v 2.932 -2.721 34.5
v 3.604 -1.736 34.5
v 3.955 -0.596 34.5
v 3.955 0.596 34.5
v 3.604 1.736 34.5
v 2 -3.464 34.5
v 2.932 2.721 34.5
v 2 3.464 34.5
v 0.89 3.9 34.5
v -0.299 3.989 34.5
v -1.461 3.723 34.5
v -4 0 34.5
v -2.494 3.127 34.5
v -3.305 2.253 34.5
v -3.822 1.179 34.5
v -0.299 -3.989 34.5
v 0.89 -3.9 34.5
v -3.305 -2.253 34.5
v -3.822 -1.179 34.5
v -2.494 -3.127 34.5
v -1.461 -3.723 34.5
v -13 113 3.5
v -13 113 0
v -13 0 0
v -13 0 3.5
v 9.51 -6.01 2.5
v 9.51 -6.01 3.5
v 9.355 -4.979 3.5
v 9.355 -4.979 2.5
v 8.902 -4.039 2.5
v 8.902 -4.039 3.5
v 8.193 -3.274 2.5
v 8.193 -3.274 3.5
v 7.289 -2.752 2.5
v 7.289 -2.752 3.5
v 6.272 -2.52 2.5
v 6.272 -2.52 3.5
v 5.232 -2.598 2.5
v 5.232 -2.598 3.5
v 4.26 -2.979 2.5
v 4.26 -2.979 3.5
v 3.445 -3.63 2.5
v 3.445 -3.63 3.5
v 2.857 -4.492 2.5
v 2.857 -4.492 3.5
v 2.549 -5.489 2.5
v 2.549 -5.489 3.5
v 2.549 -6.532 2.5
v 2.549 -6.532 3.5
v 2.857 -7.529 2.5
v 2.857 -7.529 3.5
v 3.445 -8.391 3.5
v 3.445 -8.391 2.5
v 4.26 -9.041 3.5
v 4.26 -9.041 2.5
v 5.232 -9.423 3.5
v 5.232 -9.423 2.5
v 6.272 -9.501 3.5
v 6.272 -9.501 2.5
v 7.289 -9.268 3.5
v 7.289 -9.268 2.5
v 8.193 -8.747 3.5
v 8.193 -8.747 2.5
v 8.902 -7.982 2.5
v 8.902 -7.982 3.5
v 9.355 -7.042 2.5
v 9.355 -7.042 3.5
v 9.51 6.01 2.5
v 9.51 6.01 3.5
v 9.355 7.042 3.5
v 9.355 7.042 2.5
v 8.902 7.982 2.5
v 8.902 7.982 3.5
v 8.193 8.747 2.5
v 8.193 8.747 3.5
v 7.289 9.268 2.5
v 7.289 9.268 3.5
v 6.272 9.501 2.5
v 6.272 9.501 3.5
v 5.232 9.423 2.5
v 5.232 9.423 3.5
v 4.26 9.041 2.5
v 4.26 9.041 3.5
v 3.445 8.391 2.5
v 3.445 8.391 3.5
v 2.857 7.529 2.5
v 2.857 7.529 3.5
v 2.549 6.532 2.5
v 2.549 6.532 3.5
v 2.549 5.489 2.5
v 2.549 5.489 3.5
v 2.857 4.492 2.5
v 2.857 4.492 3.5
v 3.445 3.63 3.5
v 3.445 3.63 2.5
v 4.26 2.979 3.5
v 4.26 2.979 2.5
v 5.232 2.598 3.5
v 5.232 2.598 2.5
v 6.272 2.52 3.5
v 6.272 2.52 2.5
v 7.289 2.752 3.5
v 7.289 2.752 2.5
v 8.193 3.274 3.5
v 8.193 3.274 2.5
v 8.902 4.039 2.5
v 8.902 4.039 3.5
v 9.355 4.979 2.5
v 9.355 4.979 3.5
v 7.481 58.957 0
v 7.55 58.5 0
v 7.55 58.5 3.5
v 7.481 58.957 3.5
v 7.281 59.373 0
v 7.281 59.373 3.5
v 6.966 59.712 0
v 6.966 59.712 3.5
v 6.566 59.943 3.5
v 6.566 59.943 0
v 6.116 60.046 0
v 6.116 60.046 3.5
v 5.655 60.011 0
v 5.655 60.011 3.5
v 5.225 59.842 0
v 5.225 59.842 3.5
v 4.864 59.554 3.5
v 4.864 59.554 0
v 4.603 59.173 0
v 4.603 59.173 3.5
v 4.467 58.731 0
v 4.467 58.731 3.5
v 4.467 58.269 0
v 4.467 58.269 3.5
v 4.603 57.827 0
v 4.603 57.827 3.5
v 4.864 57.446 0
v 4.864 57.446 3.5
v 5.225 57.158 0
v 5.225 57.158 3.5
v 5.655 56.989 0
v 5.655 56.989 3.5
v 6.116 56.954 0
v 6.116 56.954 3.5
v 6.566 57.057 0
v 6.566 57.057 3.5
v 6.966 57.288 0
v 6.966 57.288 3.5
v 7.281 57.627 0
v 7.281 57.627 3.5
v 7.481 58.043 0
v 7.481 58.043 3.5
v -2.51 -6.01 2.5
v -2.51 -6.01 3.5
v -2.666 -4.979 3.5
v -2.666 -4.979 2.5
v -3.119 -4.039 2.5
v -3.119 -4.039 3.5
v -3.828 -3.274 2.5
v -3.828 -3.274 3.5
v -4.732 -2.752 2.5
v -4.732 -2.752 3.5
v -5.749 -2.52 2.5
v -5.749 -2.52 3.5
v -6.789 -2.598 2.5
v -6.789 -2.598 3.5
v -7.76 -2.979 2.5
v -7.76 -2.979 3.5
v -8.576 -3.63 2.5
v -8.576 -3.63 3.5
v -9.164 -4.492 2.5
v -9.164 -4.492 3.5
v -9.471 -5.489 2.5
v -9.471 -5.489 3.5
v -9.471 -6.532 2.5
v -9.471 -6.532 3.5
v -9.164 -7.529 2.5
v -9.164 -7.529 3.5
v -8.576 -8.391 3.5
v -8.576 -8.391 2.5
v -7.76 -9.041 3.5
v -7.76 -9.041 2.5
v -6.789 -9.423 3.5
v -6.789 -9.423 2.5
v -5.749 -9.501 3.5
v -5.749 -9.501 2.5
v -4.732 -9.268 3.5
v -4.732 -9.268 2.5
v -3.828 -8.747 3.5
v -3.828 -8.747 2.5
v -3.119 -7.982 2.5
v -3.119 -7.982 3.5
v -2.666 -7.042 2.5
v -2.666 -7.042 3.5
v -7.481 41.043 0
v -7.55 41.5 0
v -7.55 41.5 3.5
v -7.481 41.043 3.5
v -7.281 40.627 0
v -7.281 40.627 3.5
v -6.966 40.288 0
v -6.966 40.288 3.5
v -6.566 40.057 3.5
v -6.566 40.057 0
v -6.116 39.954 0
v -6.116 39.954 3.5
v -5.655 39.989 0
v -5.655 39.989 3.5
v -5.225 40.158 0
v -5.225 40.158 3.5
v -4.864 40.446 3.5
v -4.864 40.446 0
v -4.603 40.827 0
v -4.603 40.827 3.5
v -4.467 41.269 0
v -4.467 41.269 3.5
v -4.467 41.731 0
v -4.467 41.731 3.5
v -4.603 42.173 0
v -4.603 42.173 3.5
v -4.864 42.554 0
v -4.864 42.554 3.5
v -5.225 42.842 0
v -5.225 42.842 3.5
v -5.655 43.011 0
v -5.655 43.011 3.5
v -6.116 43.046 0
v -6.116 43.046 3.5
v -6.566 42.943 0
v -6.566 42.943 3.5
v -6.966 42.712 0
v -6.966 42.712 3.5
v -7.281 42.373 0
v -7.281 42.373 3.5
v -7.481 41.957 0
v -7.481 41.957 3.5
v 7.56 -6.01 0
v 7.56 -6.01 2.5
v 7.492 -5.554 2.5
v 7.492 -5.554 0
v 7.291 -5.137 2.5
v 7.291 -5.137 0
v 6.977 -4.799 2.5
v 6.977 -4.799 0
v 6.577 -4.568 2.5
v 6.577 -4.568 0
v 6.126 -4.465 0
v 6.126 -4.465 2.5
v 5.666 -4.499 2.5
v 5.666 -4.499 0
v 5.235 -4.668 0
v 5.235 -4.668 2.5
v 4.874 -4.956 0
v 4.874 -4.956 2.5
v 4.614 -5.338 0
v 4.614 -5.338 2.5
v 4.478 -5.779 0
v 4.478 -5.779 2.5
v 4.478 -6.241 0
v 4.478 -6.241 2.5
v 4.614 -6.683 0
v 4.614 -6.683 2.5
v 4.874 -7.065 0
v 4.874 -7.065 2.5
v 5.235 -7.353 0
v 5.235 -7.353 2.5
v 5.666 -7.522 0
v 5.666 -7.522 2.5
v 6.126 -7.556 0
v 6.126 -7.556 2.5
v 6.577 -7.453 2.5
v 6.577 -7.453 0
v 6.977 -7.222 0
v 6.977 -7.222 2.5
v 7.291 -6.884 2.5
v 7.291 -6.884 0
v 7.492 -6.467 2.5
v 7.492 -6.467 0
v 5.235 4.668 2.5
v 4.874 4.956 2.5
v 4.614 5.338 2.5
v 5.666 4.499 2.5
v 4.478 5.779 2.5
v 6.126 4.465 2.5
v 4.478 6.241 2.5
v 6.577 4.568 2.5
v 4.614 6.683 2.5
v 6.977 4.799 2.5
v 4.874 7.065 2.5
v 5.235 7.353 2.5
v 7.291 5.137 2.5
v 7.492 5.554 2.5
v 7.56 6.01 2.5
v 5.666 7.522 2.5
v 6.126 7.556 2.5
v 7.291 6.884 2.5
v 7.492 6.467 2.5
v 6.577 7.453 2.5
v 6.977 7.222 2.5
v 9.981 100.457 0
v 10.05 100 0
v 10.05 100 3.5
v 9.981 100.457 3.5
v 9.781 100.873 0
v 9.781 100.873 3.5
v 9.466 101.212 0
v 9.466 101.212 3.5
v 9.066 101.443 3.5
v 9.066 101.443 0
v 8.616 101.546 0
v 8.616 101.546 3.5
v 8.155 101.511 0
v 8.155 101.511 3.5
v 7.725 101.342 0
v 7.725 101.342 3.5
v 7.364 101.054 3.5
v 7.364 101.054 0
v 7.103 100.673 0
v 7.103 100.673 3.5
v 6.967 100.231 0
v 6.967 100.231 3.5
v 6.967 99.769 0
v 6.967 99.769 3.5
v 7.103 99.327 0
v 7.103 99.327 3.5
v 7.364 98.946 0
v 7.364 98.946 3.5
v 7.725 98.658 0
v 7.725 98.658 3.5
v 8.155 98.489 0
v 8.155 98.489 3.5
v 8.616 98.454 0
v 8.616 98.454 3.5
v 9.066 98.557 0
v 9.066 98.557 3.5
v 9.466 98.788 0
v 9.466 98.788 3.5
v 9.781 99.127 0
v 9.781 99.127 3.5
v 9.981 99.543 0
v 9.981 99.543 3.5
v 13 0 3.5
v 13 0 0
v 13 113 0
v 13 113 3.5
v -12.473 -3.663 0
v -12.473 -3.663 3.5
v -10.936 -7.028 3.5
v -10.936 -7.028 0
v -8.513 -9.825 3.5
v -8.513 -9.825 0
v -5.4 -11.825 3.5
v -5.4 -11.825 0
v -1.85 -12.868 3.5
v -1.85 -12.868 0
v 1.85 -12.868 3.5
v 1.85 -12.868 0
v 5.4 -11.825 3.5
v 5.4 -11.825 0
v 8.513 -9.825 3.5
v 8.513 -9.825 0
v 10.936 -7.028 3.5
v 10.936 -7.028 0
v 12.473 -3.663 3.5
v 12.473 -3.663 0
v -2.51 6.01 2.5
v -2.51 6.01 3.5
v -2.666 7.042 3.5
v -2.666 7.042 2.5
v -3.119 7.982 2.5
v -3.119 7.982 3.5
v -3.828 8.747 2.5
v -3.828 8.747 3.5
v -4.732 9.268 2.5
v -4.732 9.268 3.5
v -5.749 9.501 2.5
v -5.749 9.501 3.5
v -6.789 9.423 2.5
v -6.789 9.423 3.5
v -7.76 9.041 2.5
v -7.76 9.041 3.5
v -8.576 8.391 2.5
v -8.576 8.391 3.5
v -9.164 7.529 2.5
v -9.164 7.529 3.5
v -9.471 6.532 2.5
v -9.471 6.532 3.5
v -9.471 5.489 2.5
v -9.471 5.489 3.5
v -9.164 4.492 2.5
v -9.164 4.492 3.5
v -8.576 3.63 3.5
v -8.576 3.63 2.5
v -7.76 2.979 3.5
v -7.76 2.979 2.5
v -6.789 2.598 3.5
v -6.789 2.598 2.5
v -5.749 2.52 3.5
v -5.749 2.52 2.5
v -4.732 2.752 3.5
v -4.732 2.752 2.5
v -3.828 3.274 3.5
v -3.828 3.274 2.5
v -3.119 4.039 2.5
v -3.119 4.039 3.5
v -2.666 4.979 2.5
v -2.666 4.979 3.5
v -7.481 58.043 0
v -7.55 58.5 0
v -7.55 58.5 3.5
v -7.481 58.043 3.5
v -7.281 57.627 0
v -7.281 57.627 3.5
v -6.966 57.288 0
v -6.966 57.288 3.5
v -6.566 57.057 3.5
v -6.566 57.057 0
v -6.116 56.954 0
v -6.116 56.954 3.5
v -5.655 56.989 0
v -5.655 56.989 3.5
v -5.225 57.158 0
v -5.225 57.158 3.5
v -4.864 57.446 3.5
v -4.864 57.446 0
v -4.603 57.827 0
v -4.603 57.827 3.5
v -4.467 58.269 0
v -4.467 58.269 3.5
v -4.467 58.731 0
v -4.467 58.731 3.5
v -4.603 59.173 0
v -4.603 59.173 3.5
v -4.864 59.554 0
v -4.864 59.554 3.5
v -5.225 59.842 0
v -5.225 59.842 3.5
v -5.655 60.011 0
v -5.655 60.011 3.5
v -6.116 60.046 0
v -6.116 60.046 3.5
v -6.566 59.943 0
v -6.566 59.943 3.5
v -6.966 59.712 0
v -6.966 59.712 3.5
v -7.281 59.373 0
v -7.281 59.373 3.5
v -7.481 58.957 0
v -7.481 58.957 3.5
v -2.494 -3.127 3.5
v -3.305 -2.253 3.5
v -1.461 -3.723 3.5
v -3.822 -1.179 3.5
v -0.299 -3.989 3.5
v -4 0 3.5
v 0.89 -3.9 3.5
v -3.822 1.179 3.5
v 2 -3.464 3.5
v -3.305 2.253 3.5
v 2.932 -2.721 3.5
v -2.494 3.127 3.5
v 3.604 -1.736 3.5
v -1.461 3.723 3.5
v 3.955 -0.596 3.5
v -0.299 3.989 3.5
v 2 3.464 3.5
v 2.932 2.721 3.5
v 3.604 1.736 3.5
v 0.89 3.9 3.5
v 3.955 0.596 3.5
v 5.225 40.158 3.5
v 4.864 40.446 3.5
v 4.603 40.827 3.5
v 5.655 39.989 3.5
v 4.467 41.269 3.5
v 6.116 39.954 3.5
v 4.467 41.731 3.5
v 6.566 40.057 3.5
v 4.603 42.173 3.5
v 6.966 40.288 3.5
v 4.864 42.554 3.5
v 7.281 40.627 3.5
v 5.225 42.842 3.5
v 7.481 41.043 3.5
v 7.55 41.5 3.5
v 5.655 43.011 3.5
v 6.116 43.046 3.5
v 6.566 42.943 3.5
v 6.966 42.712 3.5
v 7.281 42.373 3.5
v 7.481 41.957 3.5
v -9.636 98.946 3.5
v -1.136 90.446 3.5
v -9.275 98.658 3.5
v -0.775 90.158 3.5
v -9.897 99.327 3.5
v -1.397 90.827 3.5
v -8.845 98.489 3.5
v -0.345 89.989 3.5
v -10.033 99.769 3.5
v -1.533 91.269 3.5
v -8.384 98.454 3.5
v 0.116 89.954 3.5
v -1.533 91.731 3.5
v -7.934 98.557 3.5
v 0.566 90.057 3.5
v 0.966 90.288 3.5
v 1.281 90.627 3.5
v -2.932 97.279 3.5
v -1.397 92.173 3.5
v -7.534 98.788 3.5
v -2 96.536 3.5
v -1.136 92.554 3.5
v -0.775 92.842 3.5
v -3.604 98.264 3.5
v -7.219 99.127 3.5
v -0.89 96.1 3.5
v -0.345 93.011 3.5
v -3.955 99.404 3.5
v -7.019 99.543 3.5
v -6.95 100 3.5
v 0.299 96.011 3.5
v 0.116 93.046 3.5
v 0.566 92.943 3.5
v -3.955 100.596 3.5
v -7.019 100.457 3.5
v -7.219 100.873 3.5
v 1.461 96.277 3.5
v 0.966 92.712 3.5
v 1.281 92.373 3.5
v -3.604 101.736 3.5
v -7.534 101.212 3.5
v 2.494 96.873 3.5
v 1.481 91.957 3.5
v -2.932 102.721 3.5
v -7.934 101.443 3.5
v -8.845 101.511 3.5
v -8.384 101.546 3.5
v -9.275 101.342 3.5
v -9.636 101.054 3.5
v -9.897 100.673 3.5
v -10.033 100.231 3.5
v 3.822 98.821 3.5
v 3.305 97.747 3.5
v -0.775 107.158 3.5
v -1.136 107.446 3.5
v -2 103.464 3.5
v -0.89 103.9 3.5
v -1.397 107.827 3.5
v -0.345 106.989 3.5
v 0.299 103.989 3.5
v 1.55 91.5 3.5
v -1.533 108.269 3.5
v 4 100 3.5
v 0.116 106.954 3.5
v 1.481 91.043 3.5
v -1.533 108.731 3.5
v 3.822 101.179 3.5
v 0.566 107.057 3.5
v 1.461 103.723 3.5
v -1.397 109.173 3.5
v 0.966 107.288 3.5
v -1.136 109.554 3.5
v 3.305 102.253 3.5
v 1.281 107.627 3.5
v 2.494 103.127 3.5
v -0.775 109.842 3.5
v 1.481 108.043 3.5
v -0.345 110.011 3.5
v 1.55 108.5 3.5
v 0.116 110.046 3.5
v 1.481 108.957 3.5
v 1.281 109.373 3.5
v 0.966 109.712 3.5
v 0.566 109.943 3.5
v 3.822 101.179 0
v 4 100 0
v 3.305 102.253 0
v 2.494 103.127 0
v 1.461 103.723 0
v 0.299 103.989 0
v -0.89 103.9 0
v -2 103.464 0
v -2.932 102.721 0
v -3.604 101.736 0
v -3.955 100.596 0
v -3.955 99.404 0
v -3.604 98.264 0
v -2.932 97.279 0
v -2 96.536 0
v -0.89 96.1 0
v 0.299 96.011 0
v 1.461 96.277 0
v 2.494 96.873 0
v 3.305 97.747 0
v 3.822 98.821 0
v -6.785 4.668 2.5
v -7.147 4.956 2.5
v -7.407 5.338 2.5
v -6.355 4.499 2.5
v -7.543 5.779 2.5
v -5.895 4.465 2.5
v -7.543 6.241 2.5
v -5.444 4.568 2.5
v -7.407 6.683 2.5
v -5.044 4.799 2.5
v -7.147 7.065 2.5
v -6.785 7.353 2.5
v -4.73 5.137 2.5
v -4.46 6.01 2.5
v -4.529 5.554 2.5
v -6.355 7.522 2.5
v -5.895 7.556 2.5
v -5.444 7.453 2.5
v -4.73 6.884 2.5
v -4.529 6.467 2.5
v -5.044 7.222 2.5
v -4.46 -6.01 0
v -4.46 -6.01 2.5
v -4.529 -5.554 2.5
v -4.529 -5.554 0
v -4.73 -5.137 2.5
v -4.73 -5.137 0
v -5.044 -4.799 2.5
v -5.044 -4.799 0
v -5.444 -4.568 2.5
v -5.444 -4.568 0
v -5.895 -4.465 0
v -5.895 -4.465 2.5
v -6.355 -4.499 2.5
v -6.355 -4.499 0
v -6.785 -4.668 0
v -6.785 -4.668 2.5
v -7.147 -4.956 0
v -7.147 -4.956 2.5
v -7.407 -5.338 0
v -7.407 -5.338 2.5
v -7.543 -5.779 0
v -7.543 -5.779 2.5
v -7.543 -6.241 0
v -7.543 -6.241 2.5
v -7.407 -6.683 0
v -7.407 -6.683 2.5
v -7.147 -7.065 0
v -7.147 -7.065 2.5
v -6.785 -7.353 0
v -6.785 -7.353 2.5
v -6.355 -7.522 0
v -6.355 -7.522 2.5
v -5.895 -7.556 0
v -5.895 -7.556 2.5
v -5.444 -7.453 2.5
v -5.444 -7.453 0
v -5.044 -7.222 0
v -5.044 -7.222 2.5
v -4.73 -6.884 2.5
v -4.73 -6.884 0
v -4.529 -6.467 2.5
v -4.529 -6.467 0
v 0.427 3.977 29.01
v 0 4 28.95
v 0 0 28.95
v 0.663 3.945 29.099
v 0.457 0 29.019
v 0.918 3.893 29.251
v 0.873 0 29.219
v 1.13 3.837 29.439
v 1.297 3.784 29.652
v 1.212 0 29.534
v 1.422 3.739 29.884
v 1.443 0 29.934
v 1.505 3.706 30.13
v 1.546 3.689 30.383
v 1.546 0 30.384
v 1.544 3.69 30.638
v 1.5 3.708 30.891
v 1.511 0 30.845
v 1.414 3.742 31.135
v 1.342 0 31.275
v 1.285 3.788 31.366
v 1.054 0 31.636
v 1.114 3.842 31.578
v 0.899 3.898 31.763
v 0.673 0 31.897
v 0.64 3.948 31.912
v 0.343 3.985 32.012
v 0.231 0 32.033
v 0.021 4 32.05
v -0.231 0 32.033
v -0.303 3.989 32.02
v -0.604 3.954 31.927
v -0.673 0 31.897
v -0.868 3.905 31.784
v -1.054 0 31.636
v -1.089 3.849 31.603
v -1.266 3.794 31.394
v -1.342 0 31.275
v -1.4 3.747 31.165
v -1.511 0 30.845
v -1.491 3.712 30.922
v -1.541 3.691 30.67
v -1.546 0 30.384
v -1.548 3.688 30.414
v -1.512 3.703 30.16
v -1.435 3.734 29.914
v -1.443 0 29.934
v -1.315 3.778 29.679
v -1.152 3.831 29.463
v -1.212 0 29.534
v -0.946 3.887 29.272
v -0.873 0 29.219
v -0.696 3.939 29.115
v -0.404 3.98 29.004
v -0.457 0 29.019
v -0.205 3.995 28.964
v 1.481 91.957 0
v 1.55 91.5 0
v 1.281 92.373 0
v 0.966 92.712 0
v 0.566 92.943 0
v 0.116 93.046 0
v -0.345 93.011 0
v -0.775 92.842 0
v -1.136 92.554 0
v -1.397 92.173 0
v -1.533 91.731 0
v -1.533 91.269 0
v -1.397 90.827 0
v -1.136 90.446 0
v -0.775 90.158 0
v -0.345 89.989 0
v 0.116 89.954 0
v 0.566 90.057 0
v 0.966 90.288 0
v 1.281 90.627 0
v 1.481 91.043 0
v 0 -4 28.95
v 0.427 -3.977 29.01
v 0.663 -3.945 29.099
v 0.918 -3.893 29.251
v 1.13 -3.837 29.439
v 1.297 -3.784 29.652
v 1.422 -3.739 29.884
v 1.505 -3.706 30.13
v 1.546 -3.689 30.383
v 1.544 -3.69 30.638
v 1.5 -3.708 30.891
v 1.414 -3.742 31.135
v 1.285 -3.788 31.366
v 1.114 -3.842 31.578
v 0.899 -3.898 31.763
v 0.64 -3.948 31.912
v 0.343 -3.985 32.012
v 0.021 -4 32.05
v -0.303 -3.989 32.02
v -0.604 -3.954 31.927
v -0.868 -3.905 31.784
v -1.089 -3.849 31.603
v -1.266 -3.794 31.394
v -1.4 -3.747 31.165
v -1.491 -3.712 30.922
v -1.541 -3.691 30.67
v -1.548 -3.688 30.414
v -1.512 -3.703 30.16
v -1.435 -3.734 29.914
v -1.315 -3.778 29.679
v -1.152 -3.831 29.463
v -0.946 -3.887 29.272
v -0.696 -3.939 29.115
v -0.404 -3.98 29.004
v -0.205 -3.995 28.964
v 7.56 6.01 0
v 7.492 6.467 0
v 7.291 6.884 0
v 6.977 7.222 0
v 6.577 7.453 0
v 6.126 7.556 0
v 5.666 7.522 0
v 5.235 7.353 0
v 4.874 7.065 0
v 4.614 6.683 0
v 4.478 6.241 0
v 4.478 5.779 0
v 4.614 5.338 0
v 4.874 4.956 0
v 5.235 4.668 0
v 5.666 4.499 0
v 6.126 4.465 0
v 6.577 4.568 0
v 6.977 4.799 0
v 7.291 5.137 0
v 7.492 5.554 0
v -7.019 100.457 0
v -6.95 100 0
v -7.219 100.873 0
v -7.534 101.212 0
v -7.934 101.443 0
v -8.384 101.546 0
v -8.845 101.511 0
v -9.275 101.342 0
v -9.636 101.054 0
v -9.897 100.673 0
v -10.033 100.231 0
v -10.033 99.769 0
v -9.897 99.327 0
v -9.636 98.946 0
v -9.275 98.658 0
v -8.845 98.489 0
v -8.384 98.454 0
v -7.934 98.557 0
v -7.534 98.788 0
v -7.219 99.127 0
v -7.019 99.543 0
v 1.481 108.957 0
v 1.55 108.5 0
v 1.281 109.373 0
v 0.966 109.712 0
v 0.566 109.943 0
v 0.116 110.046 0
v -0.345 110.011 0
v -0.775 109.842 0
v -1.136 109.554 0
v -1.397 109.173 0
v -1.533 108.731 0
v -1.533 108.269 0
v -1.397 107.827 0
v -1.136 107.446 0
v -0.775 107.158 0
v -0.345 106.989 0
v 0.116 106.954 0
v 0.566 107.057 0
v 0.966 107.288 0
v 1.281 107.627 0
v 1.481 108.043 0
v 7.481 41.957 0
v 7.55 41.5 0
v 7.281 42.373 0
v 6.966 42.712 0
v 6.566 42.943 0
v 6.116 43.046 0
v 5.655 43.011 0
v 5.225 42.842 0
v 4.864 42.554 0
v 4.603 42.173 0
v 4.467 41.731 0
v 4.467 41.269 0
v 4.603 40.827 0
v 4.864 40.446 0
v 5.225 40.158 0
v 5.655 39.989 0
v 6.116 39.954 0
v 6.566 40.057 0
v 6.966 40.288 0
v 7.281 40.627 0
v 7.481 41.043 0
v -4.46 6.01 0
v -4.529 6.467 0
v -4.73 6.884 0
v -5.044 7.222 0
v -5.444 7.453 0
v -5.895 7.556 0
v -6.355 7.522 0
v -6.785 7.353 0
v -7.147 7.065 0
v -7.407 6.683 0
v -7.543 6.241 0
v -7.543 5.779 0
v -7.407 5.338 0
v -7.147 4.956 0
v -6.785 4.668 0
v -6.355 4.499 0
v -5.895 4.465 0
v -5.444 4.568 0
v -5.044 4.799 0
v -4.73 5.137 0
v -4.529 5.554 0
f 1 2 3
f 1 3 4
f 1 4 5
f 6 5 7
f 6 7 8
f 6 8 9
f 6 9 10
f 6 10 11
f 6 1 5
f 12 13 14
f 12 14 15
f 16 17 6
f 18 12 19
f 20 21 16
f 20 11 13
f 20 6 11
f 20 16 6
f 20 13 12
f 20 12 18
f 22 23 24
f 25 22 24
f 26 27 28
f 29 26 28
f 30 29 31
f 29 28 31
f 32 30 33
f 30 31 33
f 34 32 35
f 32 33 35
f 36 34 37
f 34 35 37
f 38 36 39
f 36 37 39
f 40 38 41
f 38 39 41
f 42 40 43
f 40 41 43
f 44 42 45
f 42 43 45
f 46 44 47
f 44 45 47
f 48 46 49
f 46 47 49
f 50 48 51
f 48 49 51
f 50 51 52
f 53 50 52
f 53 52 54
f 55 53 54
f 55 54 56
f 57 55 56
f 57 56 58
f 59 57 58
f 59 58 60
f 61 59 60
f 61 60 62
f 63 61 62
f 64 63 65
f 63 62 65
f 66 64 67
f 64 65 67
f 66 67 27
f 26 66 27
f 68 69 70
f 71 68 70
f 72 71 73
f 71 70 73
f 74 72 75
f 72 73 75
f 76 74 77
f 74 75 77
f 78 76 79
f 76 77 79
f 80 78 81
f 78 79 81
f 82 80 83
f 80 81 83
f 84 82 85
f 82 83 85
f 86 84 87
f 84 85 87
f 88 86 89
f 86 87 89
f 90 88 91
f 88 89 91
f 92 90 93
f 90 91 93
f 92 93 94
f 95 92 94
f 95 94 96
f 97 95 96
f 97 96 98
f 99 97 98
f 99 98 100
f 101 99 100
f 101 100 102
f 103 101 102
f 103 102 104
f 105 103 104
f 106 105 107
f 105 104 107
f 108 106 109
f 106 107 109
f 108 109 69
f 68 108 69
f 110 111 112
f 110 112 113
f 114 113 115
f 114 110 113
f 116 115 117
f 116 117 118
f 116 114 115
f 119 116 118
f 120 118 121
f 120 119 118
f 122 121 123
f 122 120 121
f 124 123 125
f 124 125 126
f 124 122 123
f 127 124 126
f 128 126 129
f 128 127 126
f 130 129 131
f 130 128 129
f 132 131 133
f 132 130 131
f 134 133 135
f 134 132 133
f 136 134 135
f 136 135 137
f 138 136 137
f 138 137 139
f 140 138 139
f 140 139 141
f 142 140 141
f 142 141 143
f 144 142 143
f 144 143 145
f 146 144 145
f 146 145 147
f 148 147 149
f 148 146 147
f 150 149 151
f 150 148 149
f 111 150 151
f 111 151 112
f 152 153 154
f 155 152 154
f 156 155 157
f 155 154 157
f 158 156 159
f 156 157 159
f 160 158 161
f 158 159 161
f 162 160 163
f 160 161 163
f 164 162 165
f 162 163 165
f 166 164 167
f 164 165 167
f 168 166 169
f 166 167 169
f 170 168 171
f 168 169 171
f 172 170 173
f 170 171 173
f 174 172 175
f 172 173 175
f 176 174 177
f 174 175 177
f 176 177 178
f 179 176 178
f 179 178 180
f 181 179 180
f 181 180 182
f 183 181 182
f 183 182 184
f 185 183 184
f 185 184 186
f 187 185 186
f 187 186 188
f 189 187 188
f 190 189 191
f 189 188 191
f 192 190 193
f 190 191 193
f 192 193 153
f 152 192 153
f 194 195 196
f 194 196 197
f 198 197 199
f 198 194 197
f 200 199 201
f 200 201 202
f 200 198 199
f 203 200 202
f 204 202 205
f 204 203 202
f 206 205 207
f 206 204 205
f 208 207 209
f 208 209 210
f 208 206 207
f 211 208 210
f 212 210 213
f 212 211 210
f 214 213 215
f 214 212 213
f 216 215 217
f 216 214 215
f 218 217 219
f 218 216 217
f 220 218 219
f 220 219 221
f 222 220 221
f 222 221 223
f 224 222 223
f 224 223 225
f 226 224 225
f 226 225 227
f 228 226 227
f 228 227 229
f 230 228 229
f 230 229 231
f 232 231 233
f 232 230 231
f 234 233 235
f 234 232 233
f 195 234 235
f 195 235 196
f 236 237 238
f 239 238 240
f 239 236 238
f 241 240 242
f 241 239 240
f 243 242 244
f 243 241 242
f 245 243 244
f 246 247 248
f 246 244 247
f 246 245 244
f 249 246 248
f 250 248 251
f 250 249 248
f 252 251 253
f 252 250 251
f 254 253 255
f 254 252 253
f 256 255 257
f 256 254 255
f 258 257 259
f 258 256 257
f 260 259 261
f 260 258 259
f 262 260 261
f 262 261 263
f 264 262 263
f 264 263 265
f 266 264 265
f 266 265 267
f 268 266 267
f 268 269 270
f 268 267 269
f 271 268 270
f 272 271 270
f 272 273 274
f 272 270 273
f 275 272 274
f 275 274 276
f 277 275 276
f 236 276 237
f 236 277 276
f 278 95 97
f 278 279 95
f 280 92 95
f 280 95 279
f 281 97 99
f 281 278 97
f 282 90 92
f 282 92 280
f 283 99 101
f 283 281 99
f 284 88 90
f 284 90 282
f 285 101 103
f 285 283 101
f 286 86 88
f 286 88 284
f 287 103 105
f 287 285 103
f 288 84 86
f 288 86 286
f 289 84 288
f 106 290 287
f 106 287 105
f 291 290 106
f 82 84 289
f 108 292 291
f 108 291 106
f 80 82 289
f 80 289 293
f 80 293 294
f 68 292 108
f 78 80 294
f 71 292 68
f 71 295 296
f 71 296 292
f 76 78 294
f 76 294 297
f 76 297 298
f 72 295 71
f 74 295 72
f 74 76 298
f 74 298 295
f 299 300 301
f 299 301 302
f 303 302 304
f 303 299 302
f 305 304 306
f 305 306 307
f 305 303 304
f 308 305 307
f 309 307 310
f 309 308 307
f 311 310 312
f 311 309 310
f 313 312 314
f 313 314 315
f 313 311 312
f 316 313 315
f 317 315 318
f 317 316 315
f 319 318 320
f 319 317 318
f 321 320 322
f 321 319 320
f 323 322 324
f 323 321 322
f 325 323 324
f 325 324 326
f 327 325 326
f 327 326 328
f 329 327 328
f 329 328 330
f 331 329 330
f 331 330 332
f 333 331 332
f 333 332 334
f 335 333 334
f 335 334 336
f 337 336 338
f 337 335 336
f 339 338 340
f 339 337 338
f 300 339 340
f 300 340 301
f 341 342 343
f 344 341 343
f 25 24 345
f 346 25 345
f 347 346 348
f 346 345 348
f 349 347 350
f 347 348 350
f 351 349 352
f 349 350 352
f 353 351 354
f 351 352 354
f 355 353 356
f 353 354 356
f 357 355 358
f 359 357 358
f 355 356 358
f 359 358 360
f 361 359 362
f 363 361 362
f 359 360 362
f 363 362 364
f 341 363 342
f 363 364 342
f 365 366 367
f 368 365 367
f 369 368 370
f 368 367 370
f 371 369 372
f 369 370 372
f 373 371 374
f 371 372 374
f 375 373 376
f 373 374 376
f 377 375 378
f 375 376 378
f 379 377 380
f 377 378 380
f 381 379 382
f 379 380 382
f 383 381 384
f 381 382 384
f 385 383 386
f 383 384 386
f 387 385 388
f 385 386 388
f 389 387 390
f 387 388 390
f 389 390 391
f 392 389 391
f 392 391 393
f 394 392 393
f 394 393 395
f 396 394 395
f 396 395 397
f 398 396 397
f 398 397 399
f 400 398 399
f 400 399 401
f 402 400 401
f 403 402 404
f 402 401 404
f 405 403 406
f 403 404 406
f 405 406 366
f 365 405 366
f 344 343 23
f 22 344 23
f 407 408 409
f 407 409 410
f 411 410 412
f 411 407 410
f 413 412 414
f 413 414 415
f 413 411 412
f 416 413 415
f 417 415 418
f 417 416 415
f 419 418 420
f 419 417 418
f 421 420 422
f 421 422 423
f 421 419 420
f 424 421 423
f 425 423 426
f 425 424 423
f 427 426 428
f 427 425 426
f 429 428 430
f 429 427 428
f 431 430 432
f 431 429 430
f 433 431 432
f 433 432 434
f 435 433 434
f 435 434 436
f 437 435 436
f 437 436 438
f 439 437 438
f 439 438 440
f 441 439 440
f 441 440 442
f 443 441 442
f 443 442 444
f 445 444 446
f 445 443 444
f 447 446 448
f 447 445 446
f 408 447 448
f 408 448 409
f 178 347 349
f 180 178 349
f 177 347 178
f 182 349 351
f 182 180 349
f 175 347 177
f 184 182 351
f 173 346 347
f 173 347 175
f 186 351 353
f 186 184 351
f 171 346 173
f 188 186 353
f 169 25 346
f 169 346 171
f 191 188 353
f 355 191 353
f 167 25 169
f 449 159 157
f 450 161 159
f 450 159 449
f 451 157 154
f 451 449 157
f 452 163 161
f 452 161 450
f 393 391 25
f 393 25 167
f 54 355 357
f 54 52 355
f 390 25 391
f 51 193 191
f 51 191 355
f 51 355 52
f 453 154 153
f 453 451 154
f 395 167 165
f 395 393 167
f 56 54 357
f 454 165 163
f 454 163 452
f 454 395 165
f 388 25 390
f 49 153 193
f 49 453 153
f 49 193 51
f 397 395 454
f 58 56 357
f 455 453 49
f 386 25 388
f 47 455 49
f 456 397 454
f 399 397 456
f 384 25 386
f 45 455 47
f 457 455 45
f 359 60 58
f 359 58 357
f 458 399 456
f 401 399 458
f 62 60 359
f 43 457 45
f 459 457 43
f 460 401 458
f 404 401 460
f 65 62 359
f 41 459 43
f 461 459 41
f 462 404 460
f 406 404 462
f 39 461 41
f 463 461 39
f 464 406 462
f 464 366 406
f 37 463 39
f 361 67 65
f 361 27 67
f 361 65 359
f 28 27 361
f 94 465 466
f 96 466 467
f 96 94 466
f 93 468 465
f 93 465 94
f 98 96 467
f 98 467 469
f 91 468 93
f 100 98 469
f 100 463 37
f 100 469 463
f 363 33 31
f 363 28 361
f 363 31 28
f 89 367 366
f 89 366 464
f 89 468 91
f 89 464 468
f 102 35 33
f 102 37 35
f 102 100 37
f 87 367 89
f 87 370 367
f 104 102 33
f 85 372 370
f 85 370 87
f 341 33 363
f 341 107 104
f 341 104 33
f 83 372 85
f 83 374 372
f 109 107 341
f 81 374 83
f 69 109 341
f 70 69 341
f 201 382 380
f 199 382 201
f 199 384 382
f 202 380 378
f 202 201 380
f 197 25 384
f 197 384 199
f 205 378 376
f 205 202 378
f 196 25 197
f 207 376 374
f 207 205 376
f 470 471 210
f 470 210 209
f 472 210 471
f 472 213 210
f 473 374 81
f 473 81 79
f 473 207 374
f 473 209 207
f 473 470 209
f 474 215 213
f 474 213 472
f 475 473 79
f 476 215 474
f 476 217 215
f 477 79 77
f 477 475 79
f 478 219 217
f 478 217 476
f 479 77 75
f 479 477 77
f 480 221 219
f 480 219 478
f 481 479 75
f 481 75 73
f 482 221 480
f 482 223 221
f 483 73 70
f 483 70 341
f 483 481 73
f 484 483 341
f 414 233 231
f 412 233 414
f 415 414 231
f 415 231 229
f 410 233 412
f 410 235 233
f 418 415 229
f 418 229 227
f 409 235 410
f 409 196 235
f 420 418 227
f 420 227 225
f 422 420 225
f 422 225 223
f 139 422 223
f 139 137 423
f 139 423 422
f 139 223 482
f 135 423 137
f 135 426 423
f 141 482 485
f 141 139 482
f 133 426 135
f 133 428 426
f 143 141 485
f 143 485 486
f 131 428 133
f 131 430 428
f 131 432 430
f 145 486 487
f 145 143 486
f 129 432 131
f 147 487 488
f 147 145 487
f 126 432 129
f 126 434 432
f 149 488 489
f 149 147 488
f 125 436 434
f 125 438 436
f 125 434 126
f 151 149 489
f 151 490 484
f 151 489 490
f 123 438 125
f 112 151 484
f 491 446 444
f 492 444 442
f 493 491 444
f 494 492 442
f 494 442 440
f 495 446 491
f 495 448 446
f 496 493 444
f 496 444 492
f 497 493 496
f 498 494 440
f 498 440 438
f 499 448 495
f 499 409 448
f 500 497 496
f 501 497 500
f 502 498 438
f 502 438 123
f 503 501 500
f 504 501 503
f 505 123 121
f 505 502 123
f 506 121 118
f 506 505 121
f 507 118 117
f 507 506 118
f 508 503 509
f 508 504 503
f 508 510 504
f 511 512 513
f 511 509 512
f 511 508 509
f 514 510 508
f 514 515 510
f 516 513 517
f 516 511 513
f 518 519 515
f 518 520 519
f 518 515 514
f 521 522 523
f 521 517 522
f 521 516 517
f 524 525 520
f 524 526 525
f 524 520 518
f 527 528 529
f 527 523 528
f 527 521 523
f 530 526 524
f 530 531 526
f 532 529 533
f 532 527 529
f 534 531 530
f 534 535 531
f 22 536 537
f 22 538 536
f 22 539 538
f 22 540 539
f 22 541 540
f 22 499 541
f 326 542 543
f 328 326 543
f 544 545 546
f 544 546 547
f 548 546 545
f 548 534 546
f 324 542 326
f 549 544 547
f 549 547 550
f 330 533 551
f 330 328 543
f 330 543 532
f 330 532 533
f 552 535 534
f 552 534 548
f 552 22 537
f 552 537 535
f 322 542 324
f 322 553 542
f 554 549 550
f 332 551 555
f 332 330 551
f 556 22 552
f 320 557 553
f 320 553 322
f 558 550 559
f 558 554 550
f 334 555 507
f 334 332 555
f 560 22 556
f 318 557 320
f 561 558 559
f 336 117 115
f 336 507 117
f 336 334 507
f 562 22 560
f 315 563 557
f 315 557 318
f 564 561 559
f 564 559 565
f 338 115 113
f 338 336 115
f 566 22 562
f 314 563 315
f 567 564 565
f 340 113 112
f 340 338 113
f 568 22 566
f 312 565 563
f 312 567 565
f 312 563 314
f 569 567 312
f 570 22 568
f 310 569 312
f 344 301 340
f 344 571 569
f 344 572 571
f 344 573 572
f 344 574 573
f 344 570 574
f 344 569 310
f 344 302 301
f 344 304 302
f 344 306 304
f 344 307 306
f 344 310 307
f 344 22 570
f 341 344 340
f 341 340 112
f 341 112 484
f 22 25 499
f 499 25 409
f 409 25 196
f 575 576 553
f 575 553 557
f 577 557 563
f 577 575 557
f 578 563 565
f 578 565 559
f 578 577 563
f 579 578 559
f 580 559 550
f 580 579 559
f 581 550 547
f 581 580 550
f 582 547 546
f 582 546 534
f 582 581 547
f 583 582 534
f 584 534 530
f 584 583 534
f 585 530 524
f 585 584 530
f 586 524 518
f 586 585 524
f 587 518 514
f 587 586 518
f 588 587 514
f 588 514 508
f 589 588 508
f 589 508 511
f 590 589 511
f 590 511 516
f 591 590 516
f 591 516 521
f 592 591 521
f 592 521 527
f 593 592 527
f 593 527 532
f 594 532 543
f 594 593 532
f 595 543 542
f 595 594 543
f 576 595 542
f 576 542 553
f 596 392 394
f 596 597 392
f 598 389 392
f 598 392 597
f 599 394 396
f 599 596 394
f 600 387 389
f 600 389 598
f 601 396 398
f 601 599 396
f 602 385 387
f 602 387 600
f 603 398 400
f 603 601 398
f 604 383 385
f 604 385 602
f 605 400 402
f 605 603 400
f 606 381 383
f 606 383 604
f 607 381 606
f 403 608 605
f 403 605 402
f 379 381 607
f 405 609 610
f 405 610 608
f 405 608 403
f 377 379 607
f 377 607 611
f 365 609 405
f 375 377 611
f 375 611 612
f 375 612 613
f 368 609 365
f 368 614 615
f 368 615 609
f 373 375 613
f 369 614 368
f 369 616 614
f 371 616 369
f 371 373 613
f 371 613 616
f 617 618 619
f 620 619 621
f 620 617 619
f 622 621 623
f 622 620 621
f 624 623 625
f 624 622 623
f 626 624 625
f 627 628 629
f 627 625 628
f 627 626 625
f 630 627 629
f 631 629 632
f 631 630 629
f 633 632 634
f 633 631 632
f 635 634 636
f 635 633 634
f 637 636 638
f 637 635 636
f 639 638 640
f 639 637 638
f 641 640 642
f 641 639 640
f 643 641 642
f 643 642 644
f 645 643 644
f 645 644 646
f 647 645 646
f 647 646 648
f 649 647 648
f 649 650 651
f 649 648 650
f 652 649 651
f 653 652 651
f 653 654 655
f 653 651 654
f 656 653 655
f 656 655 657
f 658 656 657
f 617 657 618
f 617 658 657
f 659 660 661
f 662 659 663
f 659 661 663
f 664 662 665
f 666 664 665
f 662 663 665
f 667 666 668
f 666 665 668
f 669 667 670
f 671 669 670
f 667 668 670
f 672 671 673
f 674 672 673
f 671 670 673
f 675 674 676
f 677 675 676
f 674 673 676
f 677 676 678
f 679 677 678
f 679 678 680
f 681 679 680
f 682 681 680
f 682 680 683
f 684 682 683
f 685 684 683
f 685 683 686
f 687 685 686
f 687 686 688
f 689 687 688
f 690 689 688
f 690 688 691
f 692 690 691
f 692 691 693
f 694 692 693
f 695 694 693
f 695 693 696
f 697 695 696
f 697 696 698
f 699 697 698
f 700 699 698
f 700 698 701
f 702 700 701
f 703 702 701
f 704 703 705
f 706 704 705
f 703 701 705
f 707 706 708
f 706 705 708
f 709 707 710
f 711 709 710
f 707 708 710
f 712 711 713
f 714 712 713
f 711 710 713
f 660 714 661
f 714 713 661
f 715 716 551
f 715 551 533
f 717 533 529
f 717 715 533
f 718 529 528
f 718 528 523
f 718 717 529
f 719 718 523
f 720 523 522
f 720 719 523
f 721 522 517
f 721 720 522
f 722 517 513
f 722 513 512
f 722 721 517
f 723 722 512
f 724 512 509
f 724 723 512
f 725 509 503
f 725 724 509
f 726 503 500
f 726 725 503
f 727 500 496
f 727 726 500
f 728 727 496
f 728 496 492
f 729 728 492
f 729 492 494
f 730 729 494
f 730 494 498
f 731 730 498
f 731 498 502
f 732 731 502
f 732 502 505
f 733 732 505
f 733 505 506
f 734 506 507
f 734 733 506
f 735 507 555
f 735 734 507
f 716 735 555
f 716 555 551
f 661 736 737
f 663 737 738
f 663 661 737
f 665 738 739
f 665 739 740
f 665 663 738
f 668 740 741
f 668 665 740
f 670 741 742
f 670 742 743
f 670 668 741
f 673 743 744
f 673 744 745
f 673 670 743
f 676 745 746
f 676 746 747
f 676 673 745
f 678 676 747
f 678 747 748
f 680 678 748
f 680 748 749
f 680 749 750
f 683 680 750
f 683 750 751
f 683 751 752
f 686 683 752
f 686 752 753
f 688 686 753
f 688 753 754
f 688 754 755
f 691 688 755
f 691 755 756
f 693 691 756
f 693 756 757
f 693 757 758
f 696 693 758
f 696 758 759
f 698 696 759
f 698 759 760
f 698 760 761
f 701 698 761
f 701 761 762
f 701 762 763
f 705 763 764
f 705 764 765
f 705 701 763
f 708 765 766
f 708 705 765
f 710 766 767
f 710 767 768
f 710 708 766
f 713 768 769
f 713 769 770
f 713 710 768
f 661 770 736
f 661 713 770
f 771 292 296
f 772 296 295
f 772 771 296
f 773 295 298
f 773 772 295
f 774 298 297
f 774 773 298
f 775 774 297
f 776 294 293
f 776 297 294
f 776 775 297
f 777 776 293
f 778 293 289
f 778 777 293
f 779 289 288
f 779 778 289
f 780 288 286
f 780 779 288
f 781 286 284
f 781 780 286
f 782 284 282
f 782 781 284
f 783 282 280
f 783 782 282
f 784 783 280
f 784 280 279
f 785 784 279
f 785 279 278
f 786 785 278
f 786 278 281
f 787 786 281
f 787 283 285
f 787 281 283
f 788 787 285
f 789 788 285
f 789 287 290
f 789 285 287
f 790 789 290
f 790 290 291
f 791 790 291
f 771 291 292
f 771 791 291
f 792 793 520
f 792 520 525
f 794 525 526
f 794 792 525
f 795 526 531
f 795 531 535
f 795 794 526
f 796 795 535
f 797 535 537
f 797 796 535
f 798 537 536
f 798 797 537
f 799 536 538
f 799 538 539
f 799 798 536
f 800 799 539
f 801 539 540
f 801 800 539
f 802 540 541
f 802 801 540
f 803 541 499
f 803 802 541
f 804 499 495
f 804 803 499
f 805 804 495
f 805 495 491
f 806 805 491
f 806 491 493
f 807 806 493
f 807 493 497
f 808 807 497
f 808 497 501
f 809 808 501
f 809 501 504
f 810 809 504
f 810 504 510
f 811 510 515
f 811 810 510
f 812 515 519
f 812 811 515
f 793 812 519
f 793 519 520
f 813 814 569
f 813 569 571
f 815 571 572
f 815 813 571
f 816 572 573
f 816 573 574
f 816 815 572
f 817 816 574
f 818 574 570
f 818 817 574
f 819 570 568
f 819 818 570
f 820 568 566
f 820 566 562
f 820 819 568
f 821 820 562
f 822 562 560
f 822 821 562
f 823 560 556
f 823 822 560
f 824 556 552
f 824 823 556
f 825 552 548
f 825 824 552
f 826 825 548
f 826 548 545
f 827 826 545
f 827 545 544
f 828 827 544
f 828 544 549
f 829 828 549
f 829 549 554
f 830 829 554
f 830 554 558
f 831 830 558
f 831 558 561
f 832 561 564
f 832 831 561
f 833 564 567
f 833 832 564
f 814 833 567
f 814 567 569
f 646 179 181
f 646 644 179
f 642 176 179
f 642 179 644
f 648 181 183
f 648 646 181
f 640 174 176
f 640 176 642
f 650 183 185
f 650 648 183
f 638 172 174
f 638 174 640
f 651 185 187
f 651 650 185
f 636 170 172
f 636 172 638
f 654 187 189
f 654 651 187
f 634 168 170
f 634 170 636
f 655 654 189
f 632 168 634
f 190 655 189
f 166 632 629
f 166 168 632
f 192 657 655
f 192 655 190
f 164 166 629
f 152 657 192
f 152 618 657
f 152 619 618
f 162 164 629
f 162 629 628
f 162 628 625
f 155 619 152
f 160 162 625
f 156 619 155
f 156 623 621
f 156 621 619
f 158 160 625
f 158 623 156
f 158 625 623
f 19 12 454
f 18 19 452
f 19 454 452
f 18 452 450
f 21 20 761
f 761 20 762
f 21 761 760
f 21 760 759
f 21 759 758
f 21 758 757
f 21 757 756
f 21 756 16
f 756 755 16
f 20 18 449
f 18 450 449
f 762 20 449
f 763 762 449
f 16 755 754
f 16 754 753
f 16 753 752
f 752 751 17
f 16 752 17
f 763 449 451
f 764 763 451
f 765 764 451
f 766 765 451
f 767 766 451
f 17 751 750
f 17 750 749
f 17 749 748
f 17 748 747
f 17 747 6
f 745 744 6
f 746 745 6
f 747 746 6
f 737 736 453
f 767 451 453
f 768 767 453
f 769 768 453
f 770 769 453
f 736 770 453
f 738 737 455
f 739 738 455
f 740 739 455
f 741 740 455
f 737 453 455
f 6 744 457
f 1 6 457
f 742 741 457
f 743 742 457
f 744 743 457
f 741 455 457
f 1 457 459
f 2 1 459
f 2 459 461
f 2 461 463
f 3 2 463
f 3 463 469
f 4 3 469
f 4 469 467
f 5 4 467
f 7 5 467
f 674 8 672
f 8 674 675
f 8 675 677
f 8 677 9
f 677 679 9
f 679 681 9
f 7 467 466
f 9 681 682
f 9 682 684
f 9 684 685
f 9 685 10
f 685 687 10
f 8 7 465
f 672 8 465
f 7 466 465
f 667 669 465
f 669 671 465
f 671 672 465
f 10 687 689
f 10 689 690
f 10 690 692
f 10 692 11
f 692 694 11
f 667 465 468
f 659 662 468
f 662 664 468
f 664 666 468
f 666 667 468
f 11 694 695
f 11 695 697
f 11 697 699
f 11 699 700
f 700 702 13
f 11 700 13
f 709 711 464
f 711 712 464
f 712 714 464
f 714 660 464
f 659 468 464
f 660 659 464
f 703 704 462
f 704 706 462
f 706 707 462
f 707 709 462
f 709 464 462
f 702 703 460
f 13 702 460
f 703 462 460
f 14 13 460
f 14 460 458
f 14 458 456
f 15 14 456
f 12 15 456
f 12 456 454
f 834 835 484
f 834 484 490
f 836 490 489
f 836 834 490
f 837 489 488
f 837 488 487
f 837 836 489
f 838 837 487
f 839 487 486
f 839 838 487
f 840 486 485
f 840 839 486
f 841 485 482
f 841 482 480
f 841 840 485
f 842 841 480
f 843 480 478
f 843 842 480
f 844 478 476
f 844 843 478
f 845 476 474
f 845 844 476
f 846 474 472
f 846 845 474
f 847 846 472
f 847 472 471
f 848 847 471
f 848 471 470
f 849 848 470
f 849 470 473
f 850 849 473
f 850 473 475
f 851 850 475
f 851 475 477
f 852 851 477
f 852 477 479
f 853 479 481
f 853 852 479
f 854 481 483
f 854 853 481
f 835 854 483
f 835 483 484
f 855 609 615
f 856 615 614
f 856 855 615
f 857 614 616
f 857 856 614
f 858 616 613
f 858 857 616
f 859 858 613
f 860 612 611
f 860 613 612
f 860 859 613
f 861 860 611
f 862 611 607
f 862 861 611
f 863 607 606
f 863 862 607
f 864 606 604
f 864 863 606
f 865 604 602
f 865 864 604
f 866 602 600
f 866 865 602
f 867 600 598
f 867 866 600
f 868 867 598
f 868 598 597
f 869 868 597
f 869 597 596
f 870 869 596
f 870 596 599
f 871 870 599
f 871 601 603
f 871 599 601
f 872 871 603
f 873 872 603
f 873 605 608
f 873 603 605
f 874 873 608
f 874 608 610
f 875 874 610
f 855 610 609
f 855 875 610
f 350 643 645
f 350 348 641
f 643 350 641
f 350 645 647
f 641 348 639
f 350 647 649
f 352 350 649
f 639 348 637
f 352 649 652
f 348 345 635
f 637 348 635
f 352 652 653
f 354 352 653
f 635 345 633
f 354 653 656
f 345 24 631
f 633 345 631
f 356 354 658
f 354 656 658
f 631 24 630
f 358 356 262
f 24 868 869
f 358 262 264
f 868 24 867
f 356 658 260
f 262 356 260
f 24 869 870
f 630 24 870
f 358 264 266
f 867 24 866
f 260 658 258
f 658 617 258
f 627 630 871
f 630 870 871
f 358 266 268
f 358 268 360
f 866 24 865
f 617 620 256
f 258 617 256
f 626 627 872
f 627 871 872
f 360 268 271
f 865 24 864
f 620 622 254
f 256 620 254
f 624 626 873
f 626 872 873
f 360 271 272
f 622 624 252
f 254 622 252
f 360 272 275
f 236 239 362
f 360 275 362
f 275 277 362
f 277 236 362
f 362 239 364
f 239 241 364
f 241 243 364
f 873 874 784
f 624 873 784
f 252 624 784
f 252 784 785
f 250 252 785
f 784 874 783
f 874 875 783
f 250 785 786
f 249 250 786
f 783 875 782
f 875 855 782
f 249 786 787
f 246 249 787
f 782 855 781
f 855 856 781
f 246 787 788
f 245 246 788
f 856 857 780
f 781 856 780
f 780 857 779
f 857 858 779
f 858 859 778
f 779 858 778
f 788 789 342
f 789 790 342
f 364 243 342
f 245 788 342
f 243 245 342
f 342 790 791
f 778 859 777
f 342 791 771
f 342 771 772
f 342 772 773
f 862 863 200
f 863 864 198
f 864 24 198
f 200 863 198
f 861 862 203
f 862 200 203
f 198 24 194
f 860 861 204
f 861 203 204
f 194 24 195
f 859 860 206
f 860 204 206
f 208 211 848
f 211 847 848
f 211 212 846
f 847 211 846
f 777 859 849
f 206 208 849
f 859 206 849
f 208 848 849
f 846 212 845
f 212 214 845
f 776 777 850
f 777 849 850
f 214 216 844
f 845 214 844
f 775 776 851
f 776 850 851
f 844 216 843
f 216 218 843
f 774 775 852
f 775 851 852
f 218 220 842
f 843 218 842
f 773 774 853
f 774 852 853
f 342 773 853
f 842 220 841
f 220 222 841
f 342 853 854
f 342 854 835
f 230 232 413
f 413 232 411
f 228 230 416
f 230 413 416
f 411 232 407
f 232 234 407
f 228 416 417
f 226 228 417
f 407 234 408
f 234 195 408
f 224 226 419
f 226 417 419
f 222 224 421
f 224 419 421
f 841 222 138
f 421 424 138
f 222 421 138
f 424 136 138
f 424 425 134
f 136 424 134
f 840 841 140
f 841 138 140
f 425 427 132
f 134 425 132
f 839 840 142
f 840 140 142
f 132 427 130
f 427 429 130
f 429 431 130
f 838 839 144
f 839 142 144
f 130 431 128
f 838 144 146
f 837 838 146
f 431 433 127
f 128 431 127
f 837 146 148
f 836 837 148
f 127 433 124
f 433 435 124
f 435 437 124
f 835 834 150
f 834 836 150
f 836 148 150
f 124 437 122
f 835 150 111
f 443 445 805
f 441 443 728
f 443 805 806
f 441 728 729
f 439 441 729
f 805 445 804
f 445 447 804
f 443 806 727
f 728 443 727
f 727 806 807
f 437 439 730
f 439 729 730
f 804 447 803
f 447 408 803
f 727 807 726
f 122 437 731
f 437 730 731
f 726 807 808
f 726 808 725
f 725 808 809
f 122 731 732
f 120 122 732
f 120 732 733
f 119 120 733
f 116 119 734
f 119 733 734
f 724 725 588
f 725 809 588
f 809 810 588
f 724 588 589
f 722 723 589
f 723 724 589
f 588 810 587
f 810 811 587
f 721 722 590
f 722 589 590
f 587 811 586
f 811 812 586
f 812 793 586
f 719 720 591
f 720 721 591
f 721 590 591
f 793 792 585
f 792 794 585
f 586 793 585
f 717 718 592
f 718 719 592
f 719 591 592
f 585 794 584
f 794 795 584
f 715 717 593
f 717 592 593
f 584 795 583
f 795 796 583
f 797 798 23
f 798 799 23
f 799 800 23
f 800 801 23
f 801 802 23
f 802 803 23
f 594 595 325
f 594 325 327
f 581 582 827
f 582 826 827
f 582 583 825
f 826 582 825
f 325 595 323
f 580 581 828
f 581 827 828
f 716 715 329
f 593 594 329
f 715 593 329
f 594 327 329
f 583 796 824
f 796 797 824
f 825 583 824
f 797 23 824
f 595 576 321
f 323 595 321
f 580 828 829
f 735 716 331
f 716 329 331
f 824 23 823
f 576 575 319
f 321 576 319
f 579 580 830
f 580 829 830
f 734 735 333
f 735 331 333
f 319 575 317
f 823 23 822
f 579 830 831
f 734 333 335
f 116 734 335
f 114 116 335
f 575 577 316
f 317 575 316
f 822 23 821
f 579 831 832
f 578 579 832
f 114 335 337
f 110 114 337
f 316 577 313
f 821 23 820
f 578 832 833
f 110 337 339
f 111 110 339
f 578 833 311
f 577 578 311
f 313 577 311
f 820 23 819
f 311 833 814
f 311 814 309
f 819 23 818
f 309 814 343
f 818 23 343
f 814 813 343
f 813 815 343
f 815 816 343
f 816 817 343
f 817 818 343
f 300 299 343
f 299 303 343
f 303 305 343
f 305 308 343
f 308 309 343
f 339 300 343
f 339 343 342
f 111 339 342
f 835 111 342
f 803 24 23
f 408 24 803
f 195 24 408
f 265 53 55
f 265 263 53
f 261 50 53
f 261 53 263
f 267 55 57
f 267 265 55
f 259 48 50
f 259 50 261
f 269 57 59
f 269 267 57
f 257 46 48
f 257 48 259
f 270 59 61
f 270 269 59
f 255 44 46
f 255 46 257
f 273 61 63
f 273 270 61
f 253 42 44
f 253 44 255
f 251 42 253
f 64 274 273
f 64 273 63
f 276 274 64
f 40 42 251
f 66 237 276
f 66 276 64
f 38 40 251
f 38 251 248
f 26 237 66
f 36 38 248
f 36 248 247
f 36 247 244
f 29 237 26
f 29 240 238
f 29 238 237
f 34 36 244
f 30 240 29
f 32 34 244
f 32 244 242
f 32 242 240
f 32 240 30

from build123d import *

# Parameters (mm, degrees)
SKETCH1_R                           = 1.55
SKETCH1_R_2                         = 4
BOSS_EXTRUDE1_DEPTH                 = 3.5
SKETCH2_R                           = 4
BOSS_EXTRUDE2_DEPTH                 = 31
SKETCH3_R                           = 3.5
CUT_EXTRUDE1_DEPTH                  = 1
CUT_EXTRUDE2_REACH                  = 120.862
CUT_EXTRUDE2_END_RADIUS             = 4
SKETCH4_R                           = 1.55
CUT_EXTRUDE2_DIRECTION_2_REACH      = 120.862
CUT_EXTRUDE2_DIRECTION_2_END_RADIUS = 4


with BuildPart() as part:
    # Sketch1 → Boss-Extrude1 (new body)
    with BuildSketch(Plane.XY):
        with BuildLine():
            Line((13, 0), (13, 113))
            Line((13, 113), (-13, 113))
            Line((-13, 113), (-13, 0))
            ThreePointArc((-13, 0), (0, -13), (13, 0))
        make_face()
        with Locations((6.01040764, 6.01040764)):
            Circle(SKETCH1_R, mode=Mode.SUBTRACT)
        with Locations((6.01040764, -6.01040764)):
            Circle(SKETCH1_R, mode=Mode.SUBTRACT)
        with Locations((-6.01040764, -6.01040764)):
            Circle(SKETCH1_R, mode=Mode.SUBTRACT)
        with Locations((-6.01040764, 6.01040764)):
            Circle(SKETCH1_R, mode=Mode.SUBTRACT)
        with Locations((0, 100)):
            Circle(SKETCH1_R_2, mode=Mode.SUBTRACT)
        with Locations((0, 108.5)):
            Circle(SKETCH1_R, mode=Mode.SUBTRACT)
        with Locations((8.5, 100)):
            Circle(SKETCH1_R, mode=Mode.SUBTRACT)
        with Locations((0, 91.5)):
            Circle(SKETCH1_R, mode=Mode.SUBTRACT)
        with Locations((-8.5, 100)):
            Circle(SKETCH1_R, mode=Mode.SUBTRACT)
        with Locations((6, 58.5)):
            Circle(SKETCH1_R, mode=Mode.SUBTRACT)
        with Locations((6, 41.5)):
            Circle(SKETCH1_R, mode=Mode.SUBTRACT)
        with Locations((-6, 58.5)):
            Circle(SKETCH1_R, mode=Mode.SUBTRACT)
        with Locations((-6, 41.5)):
            Circle(SKETCH1_R, mode=Mode.SUBTRACT)
    extrude(amount=BOSS_EXTRUDE1_DEPTH)

    # Sketch2 → Boss-Extrude2 (add)
    with BuildSketch(Plane.XY.offset(3.5)):
        Circle(SKETCH2_R)
    extrude(amount=BOSS_EXTRUDE2_DEPTH)

    # Sketch3 → Cut-Extrude1 (cut)
    with BuildSketch(Plane.XY.offset(3.5)):
        with Locations((-6.01040764, 6.01040764)):
            Circle(SKETCH3_R)
        with Locations((6.01040764, 6.01040764)):
            Circle(SKETCH3_R)
        with Locations((6.01040764, -6.01040764)):
            Circle(SKETCH3_R)
        with Locations((-6.01040764, -6.01040764)):
            Circle(SKETCH3_R)
    extrude(amount=-CUT_EXTRUDE1_DEPTH, mode=Mode.SUBTRACT)

    # Cut-Extrude2: up to this cylinder (the profile starts inside it)
    cut_extrude2_end = Plane(origin=(0, 0, 30.5), z_dir=(0, 0, -1)) * Cylinder(CUT_EXTRUDE2_END_RADIUS, 250.724, mode=Mode.PRIVATE)
    # Sketch4 → Cut-Extrude2 (cut, up to the surface)
    with BuildSketch(Plane(origin=(0, 0, 0), x_dir=(0, 0, -1), z_dir=(0, -1, 0)), mode=Mode.PRIVATE) as cut_extrude2_sk1:
        with Locations((-30.5, 0)):
            Circle(SKETCH4_R)
    cut_extrude2_tool1 = extrude(cut_extrude2_sk1.sketch, amount=-CUT_EXTRUDE2_REACH, mode=Mode.PRIVATE) & cut_extrude2_end
    add(cut_extrude2_tool1.solids().sort_by_distance((0, 0, 30.5))[0], mode=Mode.SUBTRACT)

    # Cut-Extrude2 direction 2: up to this cylinder (the profile starts inside it)
    cut_extrude2_direction_2_end = Plane(origin=(0, 0, 30.5), z_dir=(0, 0, -1)) * Cylinder(CUT_EXTRUDE2_DIRECTION_2_END_RADIUS, 250.724, mode=Mode.PRIVATE)
    # Sketch4 → Cut-Extrude2 direction 2 (cut, up to the surface)
    with BuildSketch(Plane(origin=(0, 0, 0), x_dir=(0, 0, -1), z_dir=(0, -1, 0)), mode=Mode.PRIVATE) as cut_extrude2_direction_2_sk1:
        with Locations((-30.5, 0)):
            Circle(SKETCH4_R)
    cut_extrude2_direction_2_tool1 = extrude(cut_extrude2_direction_2_sk1.sketch, amount=CUT_EXTRUDE2_DIRECTION_2_REACH, mode=Mode.PRIVATE) & cut_extrude2_direction_2_end
    add(cut_extrude2_direction_2_tool1.solids().sort_by_distance((0, 0, 30.5))[0], mode=Mode.SUBTRACT)


solid = part.part
